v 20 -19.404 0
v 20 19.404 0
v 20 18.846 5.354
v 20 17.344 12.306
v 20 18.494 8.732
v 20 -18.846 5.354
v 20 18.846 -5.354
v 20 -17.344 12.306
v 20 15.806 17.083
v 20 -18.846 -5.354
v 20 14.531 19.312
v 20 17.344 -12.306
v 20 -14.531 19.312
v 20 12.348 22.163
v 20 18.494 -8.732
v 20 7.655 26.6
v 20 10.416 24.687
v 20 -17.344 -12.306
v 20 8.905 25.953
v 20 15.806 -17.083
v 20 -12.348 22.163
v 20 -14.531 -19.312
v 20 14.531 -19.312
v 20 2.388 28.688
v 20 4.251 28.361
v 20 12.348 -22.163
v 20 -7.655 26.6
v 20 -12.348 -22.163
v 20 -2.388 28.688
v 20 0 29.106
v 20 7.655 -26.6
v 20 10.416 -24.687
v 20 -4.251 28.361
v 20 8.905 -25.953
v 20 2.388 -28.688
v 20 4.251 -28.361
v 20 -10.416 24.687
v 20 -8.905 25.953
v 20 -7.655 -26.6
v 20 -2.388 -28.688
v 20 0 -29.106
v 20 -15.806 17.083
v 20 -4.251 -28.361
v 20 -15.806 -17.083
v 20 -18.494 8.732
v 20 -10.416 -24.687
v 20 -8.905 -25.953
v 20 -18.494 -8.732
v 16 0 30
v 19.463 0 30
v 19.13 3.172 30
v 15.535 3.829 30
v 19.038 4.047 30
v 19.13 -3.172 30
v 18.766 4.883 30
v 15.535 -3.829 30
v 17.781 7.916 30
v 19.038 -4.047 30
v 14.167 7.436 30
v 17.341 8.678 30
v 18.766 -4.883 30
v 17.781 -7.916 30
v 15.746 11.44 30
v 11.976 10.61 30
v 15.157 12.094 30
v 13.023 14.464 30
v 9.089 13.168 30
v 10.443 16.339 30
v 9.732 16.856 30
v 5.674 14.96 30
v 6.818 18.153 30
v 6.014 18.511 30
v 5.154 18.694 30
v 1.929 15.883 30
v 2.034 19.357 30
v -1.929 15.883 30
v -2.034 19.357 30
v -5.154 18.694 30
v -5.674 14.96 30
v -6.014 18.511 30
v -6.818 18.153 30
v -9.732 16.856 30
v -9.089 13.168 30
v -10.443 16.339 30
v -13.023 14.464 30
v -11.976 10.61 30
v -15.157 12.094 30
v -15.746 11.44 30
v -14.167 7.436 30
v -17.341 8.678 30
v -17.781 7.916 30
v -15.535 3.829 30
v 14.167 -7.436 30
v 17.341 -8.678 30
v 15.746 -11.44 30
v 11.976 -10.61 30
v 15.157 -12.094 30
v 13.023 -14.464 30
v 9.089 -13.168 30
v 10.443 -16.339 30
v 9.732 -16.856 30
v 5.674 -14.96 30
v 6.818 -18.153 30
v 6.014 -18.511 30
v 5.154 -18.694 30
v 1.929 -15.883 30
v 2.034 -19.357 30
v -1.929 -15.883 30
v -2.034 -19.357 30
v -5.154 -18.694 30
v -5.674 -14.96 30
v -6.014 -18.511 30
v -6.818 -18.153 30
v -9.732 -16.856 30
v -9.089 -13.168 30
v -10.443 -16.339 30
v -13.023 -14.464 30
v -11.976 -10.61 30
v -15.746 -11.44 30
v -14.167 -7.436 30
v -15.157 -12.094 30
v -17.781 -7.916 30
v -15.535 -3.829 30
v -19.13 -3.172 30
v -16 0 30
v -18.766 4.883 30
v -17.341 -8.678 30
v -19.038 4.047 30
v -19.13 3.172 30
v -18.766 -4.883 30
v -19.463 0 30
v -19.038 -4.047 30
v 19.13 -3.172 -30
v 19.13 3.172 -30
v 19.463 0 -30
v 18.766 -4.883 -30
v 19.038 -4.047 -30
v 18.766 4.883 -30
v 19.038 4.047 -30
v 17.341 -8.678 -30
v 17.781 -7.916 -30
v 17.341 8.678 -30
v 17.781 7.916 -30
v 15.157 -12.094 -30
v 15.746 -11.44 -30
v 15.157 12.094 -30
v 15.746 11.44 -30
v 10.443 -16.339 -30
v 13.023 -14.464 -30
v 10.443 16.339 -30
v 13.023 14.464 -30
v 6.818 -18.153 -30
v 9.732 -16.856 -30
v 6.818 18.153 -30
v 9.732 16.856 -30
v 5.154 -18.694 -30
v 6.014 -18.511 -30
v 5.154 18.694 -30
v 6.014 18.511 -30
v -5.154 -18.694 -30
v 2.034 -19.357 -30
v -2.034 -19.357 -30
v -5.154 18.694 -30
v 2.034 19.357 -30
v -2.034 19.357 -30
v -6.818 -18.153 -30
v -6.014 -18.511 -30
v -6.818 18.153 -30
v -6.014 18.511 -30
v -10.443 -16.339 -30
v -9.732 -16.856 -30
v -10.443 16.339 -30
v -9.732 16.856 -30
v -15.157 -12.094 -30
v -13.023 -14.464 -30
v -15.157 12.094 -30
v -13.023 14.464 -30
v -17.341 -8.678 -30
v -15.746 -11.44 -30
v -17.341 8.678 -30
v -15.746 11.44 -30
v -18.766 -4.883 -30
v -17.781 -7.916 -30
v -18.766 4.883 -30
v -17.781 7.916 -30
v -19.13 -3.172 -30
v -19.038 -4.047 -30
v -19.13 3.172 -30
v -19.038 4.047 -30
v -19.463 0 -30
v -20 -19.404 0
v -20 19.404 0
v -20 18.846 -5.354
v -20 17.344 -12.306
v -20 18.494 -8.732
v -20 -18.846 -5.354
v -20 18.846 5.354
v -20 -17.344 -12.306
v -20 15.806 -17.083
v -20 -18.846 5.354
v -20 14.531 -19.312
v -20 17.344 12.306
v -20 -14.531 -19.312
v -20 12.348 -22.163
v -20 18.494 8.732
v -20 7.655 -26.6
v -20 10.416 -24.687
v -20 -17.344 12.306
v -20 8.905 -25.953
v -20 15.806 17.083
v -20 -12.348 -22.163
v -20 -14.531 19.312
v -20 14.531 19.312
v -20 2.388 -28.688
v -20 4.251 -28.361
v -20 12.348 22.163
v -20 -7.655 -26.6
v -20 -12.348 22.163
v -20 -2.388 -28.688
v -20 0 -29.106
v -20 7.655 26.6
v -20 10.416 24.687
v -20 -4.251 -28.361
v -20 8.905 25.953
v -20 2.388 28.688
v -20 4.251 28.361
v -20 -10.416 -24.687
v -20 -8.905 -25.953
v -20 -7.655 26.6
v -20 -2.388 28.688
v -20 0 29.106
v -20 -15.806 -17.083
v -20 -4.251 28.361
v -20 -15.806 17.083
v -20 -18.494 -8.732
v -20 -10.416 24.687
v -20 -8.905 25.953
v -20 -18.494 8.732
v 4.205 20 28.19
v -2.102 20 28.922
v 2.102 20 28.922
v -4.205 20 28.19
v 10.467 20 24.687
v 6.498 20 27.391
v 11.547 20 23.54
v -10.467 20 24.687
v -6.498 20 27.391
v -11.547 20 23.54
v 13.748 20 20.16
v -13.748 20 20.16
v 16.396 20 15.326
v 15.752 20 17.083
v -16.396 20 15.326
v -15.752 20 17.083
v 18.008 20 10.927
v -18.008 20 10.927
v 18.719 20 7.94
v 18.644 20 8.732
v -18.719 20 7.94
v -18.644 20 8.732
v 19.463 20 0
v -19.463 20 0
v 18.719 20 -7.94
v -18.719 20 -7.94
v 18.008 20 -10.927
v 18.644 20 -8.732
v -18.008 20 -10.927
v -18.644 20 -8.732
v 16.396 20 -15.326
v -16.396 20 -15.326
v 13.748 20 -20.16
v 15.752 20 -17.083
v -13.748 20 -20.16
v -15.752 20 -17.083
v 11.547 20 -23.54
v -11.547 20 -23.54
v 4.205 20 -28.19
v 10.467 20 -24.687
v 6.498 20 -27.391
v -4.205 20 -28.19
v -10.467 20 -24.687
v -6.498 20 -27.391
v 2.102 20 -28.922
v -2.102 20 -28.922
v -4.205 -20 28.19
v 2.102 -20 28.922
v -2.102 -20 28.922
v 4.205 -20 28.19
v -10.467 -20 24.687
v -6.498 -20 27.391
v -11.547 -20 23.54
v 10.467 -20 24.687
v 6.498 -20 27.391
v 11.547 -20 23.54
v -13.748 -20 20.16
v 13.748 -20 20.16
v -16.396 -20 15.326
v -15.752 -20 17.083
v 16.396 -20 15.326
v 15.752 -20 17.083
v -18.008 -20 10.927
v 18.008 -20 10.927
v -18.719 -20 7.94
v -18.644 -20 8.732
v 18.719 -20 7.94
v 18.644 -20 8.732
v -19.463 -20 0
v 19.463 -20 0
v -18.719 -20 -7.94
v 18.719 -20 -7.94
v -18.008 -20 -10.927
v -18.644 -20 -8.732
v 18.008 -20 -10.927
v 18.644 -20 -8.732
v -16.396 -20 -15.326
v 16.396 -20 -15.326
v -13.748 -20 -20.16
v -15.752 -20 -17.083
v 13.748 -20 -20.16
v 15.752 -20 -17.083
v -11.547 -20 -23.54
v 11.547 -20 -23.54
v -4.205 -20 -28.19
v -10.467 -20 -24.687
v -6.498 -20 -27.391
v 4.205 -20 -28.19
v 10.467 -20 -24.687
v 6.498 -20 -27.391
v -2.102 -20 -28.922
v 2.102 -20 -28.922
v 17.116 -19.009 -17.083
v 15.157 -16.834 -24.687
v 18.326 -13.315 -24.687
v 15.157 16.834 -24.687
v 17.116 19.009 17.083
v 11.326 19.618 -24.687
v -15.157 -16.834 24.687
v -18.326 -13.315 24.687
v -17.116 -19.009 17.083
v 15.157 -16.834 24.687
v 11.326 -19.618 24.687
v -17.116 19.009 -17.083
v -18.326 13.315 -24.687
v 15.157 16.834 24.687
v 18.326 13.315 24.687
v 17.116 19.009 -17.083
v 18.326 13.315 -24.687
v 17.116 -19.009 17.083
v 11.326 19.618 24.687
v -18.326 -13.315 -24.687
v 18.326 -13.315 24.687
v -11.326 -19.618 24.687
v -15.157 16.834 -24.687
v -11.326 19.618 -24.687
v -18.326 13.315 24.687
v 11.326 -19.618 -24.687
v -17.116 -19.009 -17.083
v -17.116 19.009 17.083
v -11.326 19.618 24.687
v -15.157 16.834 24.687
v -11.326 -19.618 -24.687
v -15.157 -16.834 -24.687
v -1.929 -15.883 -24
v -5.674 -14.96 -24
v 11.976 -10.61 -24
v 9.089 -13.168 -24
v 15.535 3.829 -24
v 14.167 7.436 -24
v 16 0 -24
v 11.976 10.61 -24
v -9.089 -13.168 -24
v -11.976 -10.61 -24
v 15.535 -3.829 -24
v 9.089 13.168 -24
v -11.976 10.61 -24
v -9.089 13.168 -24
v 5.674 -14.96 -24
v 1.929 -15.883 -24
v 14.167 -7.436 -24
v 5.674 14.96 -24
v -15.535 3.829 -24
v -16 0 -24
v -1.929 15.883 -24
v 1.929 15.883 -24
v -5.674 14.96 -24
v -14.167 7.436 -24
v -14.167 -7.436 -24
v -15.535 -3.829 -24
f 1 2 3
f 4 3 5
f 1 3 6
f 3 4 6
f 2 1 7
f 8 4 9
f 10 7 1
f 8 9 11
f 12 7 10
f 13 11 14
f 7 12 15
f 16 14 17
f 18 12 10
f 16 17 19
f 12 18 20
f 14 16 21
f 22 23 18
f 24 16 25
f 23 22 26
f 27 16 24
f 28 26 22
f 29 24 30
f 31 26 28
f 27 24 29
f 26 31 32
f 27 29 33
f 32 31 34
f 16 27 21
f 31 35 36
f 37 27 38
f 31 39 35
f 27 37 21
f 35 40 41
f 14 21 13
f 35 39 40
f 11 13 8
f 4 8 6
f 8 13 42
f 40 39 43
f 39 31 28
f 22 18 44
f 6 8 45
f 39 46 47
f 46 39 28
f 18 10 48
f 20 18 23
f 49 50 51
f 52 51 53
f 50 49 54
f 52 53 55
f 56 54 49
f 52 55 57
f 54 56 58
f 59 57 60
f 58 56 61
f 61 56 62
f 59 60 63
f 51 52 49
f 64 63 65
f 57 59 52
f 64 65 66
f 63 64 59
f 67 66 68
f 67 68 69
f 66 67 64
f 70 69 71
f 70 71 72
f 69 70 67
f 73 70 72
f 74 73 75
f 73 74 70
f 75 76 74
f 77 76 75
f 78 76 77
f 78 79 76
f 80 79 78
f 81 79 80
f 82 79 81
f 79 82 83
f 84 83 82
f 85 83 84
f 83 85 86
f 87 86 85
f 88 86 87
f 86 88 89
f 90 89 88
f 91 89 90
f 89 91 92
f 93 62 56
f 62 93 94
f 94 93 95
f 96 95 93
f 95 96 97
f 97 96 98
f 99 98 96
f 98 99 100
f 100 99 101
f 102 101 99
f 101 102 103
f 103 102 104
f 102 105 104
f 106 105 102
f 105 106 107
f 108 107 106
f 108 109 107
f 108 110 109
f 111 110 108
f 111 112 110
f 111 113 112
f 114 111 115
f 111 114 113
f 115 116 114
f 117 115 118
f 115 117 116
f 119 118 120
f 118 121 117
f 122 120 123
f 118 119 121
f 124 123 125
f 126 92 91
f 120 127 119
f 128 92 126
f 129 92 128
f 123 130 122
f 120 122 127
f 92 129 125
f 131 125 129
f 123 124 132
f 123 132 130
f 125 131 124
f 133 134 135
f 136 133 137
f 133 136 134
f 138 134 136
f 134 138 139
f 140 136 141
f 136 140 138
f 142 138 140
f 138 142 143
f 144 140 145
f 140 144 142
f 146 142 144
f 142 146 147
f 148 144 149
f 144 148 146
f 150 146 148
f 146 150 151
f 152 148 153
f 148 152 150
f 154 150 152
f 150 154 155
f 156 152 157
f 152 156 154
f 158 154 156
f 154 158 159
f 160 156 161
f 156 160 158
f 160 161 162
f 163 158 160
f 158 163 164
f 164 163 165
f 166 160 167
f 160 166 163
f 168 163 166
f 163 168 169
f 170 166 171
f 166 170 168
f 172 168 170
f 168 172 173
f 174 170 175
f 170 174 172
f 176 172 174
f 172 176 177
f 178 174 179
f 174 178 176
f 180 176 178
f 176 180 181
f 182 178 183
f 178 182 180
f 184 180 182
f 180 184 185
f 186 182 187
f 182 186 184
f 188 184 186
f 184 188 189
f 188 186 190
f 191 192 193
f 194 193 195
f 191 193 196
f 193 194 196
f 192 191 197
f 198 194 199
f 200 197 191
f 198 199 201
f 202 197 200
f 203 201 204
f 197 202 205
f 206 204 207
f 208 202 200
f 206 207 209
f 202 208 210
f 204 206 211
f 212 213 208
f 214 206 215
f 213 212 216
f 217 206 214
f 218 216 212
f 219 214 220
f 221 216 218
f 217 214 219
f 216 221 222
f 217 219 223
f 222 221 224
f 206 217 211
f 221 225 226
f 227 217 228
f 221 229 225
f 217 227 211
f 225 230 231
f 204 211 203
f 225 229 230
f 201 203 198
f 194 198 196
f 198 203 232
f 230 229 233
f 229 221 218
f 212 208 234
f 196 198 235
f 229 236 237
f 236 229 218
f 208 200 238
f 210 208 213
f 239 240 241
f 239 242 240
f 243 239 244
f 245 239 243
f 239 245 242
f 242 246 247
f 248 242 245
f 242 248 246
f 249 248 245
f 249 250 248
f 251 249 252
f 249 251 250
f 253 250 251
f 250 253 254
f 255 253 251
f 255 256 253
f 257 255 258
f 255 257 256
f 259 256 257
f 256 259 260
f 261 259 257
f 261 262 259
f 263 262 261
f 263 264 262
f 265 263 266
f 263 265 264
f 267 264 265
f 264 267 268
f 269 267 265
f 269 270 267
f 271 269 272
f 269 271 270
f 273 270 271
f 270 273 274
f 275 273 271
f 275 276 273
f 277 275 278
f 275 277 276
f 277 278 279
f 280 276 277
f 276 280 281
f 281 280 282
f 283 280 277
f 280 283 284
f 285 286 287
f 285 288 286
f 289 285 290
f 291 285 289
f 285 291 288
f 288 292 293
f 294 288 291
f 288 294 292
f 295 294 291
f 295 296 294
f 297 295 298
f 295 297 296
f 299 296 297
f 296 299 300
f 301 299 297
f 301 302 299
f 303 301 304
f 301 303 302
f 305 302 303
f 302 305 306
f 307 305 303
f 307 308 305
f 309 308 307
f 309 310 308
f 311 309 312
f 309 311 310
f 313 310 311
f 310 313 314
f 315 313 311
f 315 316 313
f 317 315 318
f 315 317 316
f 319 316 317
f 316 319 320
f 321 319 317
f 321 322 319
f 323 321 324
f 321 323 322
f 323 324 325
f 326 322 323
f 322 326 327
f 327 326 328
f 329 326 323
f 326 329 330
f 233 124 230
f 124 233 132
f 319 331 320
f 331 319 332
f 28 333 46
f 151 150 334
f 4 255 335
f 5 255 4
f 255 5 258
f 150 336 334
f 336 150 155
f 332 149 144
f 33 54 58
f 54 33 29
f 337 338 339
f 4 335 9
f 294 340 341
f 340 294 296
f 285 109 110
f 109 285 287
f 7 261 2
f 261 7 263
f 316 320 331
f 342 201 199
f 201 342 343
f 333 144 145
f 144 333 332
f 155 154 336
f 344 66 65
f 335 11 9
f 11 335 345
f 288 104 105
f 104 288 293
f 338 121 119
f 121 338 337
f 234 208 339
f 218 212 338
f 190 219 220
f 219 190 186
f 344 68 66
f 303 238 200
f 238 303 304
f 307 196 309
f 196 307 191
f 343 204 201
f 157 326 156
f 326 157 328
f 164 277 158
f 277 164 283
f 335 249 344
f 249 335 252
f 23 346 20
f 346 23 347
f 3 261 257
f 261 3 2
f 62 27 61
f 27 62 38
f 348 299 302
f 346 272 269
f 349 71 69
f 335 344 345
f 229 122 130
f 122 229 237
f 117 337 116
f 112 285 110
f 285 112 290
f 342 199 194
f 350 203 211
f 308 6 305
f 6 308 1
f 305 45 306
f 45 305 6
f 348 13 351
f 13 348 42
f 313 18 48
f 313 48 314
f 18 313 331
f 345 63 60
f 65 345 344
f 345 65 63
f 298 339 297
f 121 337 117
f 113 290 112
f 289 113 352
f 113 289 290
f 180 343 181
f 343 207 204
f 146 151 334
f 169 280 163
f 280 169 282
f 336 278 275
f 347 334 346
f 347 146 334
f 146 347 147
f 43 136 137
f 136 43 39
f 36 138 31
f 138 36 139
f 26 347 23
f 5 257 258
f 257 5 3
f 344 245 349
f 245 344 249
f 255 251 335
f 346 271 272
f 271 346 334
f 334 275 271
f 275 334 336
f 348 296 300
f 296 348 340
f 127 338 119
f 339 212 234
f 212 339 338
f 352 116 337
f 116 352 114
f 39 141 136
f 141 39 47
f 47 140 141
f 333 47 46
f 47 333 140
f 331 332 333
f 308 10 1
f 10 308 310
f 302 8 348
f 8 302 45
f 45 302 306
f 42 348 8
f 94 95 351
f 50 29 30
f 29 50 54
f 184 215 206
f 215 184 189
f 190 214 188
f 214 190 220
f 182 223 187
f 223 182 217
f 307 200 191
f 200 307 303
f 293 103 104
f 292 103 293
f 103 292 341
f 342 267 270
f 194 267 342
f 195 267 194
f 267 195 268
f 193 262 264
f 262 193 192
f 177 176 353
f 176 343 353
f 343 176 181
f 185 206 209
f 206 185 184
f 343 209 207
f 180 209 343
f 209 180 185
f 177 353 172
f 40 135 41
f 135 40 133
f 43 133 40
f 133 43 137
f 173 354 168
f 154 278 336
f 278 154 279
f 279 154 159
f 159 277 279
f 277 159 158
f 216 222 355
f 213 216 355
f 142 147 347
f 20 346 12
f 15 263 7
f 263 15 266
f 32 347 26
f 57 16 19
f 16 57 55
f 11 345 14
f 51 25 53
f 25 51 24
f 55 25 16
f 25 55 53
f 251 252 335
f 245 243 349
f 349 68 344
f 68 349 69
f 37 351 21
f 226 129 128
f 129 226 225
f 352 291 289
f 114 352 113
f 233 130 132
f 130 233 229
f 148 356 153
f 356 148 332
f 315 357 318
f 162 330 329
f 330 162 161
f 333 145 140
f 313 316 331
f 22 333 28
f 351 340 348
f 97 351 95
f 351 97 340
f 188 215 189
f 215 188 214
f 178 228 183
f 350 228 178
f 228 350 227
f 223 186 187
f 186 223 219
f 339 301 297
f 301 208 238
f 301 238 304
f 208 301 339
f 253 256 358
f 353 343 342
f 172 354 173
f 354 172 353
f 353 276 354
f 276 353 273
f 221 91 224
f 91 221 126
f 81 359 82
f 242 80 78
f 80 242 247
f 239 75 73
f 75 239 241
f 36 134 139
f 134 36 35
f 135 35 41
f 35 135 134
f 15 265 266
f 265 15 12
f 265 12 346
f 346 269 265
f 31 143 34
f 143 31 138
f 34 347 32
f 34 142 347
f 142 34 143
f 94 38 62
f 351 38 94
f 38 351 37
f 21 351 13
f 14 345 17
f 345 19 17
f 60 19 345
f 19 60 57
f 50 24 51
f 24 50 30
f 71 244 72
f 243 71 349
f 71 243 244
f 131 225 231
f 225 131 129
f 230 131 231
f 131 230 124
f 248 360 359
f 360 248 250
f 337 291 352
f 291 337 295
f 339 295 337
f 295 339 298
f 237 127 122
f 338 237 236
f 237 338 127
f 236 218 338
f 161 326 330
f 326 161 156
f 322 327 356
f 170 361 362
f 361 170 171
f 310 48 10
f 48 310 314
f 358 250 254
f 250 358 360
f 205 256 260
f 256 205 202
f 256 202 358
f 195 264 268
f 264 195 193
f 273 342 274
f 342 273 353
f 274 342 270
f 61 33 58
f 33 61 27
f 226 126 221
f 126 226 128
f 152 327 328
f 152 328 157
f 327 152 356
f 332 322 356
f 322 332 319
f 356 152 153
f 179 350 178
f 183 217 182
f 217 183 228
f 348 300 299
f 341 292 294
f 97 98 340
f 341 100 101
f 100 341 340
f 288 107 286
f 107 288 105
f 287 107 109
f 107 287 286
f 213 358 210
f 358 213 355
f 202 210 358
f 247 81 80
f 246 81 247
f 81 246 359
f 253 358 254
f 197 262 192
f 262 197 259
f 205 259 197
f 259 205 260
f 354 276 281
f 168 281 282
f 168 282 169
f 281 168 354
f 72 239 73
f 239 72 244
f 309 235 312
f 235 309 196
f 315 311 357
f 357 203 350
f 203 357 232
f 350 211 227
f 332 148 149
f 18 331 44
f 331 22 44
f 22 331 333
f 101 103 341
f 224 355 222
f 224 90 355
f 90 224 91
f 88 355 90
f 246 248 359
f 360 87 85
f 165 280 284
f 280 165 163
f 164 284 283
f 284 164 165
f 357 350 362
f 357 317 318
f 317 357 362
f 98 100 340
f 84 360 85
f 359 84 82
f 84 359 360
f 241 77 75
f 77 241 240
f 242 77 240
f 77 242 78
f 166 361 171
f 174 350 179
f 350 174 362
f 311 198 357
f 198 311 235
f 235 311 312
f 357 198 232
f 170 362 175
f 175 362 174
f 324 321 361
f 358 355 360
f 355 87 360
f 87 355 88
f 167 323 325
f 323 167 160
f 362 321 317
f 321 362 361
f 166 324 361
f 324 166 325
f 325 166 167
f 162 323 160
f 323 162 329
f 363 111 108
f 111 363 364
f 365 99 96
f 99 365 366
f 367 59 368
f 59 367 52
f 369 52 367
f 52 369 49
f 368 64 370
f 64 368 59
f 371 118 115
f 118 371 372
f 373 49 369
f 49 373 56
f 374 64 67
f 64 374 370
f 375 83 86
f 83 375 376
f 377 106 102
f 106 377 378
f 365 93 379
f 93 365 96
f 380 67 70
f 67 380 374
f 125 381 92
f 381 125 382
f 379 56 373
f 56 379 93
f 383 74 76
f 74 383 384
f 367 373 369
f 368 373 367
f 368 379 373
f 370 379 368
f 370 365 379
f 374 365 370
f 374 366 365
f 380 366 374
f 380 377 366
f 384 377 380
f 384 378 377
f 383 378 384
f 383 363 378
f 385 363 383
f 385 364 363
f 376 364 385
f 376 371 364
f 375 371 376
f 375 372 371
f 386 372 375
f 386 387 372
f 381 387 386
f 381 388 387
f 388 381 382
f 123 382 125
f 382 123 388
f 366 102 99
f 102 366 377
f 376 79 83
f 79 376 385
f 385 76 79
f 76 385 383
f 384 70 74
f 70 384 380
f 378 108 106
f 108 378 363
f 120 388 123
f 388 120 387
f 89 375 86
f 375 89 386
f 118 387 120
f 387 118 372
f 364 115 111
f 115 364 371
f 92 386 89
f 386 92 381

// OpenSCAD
scale([2,2,3]) {
    difference() {
        intersection() {
            cube ([20,20,20], center=true);
            sphere (14);
        }
        translate([0,0,-8])
        cylinder(h=22, r=8);
    }
}
